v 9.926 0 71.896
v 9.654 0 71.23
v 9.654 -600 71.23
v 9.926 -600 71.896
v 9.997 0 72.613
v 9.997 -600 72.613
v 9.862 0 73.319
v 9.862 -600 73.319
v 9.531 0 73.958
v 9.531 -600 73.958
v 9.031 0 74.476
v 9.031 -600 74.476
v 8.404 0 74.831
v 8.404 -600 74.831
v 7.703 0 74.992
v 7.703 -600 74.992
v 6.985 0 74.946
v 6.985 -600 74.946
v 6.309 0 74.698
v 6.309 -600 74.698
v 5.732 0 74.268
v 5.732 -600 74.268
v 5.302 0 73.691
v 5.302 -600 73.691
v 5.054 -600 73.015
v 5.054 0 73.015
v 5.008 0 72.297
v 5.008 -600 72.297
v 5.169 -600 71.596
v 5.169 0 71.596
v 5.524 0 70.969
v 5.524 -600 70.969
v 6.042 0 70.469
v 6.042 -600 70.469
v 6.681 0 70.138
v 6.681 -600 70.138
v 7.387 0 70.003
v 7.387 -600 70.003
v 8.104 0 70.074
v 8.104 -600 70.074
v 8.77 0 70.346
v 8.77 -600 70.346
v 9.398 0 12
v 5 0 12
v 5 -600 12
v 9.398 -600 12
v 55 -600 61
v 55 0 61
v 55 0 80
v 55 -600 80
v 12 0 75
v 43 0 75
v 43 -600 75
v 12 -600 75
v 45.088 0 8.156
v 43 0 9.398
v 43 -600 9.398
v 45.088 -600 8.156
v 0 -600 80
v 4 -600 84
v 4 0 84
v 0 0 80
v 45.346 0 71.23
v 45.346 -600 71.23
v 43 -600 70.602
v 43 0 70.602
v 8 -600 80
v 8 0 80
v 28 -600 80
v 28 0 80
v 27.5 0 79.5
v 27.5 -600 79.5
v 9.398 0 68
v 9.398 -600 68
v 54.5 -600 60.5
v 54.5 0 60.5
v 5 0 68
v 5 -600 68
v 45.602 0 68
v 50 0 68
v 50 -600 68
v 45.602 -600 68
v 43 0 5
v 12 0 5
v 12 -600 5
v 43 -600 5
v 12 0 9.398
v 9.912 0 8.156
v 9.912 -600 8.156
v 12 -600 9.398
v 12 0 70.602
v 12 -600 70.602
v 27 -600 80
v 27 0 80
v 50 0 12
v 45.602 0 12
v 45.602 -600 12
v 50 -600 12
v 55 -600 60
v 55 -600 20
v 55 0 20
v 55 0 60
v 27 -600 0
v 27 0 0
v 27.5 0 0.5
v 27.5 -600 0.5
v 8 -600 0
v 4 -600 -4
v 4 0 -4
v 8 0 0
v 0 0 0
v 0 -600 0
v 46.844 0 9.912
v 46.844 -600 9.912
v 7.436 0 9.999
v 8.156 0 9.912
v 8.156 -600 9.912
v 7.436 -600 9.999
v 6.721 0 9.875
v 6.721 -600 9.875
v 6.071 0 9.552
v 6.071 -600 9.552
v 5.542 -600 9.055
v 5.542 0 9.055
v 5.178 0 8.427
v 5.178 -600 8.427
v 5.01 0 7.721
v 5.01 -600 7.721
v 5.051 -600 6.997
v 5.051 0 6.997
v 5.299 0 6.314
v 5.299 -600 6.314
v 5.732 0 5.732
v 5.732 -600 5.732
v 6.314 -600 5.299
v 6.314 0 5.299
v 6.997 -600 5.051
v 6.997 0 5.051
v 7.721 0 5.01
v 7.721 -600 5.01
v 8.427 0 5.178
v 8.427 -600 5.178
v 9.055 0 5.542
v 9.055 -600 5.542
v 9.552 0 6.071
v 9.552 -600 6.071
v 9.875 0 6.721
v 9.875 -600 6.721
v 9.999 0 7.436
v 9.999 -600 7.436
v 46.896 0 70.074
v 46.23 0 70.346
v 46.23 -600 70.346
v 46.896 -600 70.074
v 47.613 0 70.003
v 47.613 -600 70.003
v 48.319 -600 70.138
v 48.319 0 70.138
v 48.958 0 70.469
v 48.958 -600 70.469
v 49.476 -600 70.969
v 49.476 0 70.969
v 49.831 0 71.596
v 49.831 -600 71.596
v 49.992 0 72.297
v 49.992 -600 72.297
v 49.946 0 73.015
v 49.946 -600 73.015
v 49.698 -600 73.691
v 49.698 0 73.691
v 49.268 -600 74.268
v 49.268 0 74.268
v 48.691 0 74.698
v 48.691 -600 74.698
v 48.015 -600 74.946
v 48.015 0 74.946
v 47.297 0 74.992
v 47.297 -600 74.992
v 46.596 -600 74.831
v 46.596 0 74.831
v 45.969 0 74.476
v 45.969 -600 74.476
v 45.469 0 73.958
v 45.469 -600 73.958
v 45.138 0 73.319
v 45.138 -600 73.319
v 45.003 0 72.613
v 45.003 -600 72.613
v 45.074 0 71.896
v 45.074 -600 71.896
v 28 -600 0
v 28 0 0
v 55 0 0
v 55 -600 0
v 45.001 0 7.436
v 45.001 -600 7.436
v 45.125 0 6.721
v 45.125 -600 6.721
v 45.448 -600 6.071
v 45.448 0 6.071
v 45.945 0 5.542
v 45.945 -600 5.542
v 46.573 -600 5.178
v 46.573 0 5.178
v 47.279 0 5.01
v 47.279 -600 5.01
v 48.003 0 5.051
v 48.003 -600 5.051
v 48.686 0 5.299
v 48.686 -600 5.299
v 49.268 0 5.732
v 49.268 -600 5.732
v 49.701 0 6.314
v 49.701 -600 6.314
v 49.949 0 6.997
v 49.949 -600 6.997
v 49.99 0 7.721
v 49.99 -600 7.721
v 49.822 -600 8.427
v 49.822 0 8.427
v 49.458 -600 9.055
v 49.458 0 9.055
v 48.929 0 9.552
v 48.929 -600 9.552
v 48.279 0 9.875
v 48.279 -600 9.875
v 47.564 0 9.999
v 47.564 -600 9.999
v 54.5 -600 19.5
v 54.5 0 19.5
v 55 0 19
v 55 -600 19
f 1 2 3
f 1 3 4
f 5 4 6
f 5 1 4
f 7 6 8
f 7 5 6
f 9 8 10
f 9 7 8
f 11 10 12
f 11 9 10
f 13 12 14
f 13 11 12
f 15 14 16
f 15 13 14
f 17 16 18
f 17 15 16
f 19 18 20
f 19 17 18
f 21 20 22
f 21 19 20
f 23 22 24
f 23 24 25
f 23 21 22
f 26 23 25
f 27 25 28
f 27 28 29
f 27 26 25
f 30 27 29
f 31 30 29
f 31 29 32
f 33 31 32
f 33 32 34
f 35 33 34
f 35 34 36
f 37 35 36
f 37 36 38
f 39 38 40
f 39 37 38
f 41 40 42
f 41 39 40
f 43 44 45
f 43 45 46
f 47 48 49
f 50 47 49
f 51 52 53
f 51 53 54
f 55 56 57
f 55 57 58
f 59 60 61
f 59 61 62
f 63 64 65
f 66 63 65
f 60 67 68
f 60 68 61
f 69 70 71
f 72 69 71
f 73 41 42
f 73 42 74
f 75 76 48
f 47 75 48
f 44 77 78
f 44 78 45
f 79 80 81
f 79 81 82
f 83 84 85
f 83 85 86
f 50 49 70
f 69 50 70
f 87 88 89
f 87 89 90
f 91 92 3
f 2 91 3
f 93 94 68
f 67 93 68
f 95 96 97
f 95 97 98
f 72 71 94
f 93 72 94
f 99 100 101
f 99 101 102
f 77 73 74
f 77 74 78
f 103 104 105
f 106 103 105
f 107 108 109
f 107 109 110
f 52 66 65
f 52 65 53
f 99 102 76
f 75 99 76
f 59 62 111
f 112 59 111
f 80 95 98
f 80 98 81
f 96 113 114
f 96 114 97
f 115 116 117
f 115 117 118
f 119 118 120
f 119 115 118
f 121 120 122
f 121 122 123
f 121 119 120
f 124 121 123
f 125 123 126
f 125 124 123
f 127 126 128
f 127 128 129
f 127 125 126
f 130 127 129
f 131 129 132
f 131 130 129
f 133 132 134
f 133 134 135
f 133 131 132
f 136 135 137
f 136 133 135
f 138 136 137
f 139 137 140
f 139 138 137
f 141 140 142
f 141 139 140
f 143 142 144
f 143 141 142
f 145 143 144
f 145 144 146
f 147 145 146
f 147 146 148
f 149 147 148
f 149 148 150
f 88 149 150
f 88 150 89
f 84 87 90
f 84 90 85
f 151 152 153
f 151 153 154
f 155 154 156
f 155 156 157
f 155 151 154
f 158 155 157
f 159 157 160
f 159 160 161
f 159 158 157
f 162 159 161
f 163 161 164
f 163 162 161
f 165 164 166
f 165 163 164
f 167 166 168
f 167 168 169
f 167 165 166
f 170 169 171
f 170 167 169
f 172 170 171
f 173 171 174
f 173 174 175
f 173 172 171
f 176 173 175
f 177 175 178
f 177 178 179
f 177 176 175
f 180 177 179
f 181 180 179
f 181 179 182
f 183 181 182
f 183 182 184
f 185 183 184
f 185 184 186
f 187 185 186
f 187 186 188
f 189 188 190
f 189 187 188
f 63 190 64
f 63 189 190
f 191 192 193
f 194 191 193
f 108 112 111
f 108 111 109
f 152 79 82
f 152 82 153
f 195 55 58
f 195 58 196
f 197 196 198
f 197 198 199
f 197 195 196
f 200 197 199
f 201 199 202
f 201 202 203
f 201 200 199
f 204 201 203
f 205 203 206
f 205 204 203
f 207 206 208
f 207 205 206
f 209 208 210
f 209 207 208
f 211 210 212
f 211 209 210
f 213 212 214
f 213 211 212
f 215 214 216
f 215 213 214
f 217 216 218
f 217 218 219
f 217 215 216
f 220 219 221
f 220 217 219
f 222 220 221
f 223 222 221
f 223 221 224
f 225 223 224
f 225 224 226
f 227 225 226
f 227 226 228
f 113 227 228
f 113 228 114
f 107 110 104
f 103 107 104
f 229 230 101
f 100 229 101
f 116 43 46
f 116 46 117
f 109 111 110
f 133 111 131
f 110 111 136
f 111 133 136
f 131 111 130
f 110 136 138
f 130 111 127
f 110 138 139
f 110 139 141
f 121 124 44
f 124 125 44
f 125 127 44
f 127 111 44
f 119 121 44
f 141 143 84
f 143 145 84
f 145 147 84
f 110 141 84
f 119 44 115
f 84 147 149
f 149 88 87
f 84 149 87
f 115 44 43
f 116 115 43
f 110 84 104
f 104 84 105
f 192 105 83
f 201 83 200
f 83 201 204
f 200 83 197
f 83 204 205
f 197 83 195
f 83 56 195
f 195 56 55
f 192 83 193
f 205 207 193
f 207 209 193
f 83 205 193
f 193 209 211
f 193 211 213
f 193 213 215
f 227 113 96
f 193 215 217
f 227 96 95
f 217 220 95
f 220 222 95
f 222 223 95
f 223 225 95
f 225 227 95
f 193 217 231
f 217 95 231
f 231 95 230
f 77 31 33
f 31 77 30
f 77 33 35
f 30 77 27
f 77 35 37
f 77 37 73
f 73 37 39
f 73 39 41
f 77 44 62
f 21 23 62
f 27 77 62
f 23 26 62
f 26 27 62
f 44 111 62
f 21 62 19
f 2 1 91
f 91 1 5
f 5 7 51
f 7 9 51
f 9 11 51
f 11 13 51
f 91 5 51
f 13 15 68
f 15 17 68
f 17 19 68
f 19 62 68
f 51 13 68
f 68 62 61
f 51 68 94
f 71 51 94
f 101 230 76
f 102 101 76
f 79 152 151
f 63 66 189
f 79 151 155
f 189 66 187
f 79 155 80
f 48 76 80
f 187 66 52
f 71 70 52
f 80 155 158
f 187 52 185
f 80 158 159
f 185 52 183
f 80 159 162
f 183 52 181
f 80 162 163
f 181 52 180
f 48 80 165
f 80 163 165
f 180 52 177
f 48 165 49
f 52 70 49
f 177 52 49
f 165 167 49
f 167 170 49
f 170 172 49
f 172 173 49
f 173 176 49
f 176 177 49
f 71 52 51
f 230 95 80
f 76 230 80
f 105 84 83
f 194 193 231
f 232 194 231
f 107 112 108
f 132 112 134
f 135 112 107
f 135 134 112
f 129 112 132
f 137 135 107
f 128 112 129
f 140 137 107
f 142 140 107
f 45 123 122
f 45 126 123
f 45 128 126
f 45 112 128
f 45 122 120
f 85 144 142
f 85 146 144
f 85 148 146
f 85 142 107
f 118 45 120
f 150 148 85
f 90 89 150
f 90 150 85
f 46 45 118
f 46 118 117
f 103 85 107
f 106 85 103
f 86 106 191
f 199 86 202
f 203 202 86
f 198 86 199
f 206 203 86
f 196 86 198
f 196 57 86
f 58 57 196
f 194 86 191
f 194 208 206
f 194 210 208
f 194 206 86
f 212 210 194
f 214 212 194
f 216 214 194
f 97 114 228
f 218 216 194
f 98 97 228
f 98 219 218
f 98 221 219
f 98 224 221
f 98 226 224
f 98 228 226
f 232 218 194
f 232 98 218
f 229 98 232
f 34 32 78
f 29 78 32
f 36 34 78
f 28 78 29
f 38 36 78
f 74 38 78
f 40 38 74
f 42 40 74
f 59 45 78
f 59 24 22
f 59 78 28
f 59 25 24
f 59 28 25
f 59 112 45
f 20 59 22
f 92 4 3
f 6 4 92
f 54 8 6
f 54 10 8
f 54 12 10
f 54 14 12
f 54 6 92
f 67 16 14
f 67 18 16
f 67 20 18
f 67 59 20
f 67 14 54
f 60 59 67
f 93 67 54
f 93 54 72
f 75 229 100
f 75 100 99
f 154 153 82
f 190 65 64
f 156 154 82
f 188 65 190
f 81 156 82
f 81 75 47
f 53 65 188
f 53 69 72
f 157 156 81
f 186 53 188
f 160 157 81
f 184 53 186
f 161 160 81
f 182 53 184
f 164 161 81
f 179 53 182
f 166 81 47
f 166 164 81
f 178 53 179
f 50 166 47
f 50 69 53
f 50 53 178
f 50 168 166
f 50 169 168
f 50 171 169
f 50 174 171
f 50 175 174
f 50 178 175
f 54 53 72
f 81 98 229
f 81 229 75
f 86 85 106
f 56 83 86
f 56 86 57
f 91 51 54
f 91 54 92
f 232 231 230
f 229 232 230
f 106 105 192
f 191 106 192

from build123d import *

# Parameters (mm, degrees)
F1_DEPTH = 600
F3_DEPTH = 600


with BuildPart() as f1:
    # F0 (on Front) → F1 (new body)
    with BuildSketch(Plane.XZ):
        Polygon((0, 80), (0, 0), (4, -4), (8, 0), (27, 0), (27.5, 0.5), (28, 0), (55, 0), (55, 19), (54.5, 19.5), (55, 20), (55, 60), (54.5, 60.5), (55, 61), (55, 80), (28, 80), (27.5, 79.5), (27, 80), (8, 80), (4, 84), align=None)
    extrude(amount=F1_DEPTH)

    # F2 (on Front) → F3 (cut, through all)
    with BuildSketch(Plane.XZ):
        with BuildLine():
            Line((5, 12), (9.398414, 12))
            Line((9.398414, 12), (8.156498, 9.912263))
            ThreePointArc((8.156498, 9.912263), (5.732233, 5.732233), (9.912263, 8.156498))
            Line((9.912263, 8.156498), (12, 9.398414))
            Line((12, 9.398414), (12, 5))
            Line((12, 5), (43, 5))
            Line((43, 5), (43, 9.398414))
            Line((43, 9.398414), (45.087737, 8.156498))
            ThreePointArc((45.087737, 8.156498), (49.267767, 5.732233), (46.843502, 9.912263))
            Line((46.843502, 9.912263), (45.601586, 12))
            Line((45.601586, 12), (50, 12))
            Line((50, 12), (50, 68))
            Line((50, 68), (45.601586, 68))
            Line((45.601586, 68), (46.230309, 70.346425))
            ThreePointArc((46.230309, 70.346425), (49.267767, 74.267767), (45.346425, 71.230309))
            Line((45.346425, 71.230309), (43, 70.601586))
            Line((43, 70.601586), (43, 75))
            Line((43, 75), (12, 75))
            Line((12, 75), (12, 70.601586))
            Line((12, 70.601586), (9.653575, 71.230309))
            ThreePointArc((9.653575, 71.230309), (5.732233, 74.267767), (8.769691, 70.346425))
            Line((8.769691, 70.346425), (9.398414, 68))
            Line((9.398414, 68), (5, 68))
            Line((5, 68), (5, 12))
        make_face()
    extrude(amount=F3_DEPTH, mode=Mode.SUBTRACT)


solid = f1.part
